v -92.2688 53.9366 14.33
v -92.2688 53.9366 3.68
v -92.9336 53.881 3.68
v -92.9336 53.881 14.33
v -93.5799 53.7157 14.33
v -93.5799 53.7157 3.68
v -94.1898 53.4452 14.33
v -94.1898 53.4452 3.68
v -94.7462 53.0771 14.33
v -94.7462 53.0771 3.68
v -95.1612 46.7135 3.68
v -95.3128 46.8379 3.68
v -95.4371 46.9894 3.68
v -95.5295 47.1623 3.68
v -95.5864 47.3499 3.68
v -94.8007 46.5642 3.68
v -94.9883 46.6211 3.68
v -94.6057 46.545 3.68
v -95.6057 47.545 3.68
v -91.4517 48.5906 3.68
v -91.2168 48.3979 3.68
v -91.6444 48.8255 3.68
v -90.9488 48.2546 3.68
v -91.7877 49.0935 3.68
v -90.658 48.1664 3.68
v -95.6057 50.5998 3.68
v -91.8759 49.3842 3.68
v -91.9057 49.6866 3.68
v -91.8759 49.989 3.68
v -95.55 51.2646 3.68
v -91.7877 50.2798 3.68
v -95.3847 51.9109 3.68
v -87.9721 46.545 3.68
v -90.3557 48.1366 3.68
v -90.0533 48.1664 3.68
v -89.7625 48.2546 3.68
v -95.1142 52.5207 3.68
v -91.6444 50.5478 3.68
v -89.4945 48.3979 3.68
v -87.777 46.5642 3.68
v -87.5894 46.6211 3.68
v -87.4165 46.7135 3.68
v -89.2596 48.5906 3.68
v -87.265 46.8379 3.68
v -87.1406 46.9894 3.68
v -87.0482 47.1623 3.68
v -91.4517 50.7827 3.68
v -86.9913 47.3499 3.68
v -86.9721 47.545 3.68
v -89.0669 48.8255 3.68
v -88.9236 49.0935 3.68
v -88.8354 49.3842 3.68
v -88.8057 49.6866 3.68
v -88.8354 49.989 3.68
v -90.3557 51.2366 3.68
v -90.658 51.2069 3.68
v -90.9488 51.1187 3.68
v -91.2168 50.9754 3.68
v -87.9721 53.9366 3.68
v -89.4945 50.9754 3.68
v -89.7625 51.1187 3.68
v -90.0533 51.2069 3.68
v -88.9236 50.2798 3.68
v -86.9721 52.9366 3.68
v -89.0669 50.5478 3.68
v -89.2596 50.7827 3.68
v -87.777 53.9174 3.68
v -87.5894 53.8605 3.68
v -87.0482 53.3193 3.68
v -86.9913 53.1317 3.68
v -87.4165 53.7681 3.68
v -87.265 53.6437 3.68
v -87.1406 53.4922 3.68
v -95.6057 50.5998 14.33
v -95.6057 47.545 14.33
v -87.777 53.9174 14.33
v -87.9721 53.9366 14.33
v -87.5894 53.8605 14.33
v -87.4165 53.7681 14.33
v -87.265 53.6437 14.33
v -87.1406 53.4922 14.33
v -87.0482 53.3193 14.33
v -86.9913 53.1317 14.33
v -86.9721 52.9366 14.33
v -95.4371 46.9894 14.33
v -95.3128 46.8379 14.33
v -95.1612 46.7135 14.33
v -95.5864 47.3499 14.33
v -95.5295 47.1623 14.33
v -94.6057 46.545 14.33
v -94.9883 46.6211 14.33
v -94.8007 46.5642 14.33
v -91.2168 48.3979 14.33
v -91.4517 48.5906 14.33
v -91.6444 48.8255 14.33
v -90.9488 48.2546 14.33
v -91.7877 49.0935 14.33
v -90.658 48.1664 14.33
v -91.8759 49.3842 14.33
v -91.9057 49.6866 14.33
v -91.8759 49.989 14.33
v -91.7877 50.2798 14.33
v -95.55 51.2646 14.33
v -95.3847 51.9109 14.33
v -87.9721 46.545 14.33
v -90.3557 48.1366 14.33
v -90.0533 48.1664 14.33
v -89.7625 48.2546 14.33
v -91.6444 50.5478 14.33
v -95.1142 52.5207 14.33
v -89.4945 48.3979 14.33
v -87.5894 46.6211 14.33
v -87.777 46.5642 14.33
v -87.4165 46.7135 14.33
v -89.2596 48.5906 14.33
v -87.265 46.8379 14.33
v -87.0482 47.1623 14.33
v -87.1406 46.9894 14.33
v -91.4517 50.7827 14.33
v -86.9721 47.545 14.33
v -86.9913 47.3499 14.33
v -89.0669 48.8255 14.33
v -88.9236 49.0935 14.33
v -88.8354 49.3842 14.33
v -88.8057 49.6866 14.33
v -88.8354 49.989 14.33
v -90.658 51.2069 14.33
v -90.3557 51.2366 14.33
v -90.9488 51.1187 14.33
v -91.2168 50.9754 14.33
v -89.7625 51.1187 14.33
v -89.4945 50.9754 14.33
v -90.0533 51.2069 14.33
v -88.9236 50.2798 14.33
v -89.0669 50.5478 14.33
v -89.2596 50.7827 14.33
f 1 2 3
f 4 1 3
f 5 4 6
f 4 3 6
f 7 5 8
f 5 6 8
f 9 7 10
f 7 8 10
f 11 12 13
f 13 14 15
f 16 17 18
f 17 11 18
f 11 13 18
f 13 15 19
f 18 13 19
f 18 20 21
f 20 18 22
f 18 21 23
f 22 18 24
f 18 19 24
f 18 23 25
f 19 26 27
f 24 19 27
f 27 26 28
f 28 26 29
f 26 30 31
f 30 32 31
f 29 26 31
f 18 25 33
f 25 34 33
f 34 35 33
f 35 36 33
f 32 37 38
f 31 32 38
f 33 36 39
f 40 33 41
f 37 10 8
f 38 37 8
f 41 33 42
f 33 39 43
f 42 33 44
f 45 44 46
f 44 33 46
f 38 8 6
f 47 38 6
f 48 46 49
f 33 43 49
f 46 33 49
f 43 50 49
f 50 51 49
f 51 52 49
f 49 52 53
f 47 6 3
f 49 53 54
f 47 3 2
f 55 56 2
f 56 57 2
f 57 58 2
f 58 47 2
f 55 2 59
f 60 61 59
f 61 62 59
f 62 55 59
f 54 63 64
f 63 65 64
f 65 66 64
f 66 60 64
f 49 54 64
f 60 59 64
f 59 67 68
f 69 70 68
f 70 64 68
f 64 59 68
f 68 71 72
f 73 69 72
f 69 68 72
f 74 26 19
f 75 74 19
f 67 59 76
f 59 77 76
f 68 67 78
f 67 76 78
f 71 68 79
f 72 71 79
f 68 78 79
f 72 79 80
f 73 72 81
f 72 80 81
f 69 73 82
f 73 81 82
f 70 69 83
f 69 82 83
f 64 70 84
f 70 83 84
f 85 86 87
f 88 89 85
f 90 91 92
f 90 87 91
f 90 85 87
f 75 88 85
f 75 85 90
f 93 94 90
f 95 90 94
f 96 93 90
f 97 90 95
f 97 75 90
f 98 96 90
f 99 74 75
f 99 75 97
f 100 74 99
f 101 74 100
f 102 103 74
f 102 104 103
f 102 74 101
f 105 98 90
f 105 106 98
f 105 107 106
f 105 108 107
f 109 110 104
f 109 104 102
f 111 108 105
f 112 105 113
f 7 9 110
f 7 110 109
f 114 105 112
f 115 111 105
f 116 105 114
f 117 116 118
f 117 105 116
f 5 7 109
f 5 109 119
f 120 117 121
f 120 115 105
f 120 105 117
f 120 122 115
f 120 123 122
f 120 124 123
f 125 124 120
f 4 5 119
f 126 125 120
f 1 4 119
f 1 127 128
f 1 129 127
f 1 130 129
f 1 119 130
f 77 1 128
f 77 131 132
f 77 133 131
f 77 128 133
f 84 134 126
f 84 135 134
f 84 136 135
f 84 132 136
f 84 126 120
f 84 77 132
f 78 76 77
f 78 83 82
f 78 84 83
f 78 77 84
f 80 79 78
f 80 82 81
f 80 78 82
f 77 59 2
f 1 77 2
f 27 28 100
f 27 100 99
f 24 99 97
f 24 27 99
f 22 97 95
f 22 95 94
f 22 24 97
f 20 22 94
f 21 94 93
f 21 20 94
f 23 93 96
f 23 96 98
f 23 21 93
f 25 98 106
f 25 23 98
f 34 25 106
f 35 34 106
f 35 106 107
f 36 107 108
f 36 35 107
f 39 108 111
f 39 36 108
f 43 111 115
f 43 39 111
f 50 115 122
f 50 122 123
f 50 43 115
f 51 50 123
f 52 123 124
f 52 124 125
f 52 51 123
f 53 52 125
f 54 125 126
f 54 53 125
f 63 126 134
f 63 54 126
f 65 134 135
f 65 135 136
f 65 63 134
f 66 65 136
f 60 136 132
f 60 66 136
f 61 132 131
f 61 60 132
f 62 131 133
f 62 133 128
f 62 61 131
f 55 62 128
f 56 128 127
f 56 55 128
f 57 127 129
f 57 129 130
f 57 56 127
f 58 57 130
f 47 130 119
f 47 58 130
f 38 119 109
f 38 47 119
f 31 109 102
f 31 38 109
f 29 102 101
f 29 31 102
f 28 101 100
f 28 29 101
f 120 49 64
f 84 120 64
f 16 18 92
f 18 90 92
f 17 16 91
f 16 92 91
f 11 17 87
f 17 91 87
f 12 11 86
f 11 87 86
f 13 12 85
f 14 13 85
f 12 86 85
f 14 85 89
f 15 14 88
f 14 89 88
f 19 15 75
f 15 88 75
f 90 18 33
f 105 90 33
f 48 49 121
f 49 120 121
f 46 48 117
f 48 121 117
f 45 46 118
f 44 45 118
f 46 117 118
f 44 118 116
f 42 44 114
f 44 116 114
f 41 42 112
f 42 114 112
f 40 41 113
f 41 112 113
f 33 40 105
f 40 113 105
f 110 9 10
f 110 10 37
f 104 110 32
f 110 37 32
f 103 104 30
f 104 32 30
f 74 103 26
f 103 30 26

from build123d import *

# Parameters (mm, degrees)
SKETCH_1_R          = 1.531489915
EXTRUDE_1_DEPTH     = 1.68
SKETCH_1_R_2        = 1.063949022
EXTRUDE_1_2_DEPTH   = 1.68
SKETCH_1_R_3        = 2.489250022
EXTRUDE_1_3_DEPTH   = 1.68
SKETCH_1_W          = 72.86
SKETCH_1_H          = 61.86
SKETCH_1_R_4        = 1.55
EXTRUDE_1_4_DEPTH   = 1.68
SKETCH_2_R          = 3
SKETCH_2_R_2        = 1.55
EXTRUDE_3_DEPTH     = 2
SKETCH_3_W          = 72.86
SKETCH_3_H          = 61.86
SKETCH_3_W_2        = 69.50125591
SKETCH_3_H_2        = 58.5
EXTRUDE_4_DEPTH     = 15.85
SKETCH_4_W          = 17
SKETCH_4_H          = 15
CUT_EXTRUDE_1_DEPTH = 3.68
SKETCH_6_W          = 7.25
SKETCH_6_H          = 16
SKETCH_6_W_2        = 2.5
SKETCH_6_H_2        = 18
CUT_EXTRUDE_3_DEPTH = 7.8
SKETCH_7_W          = 10
SKETCH_7_H          = 4
SKETCH_7_W_2        = 17
SKETCH_7_H_2        = 8
SKETCH_7_W_3        = 8
SKETCH_7_H_3        = 13.300256909
CUT_EXTRUDE_5_DEPTH = 2
SKETCH_8_R          = 1.556852558
SKETCH_8_W          = 2.041099746
SKETCH_8_H          = 24.945353107
CUT_EXTRUDE_6_DEPTH = 2
FILLET_1_R          = 1.68
FILLET_2_R          = 2
FILLET_3_R          = 1.68
FILLET_4_R          = 2
FILLET_5_R          = 3
FILLET_6_R          = 1
FILLET_7_R          = 1
SKETCH_9_R          = 4
CUT_EXTRUDE_7_DEPTH = 0.8
SKETCH_10_W         = 44.758598589
SKETCH_10_H         = 6.5
SKETCH_10_W_2       = 44.448850503
CUT_EXTRUDE_8_DEPTH = 0.8
SKETCH_11_R         = 1.55
EXTRUDE_6_DEPTH     = 10.65
CUT_EXTRUDE_9_DEPTH = 62.6
FILLET_8_R          = 4
FILLET_9_R          = 1


with BuildPart() as part:
    # 草图1 → 凸台-拉伸1 (new body)
    with BuildSketch(Plane.XY):
        with Locations((1.504266973, 51.672660554)):
            Circle(SKETCH_1_R)
    extrude(amount=EXTRUDE_1_DEPTH)


with BuildPart() as body_2:
    # 草图1 → Extrude 1 2 (new body)
    with BuildSketch(Plane.XY):
        with Locations((-18.258772408, 61.840992468)):
            Circle(SKETCH_1_R_2)
    extrude(amount=EXTRUDE_1_2_DEPTH)


with BuildPart() as body_3:
    # 草图1 → Extrude 1 3 (new body)
    with BuildSketch(Plane.XY):
        with Locations((-18.258772408, -10.975845657)):
            Circle(SKETCH_1_R_3)
    extrude(amount=EXTRUDE_1_3_DEPTH)


with BuildPart() as body_4:
    # 草图1 → Extrude 1 4 (new body)
    with BuildSketch(Plane.XY):
        with Locations((-46.758772408, 26.672660554)):
            Rectangle(SKETCH_1_W, SKETCH_1_H)
        with Locations((-76.258772408, 51.672660554)):
            Circle(SKETCH_1_R_4, mode=Mode.SUBTRACT)
        with Locations((-18.258772408, 51.672660554)):
            Circle(SKETCH_1_R_4, mode=Mode.SUBTRACT)
        with Locations((-76.258772408, 2.672660554)):
            Circle(SKETCH_1_R_4, mode=Mode.SUBTRACT)
        with Locations((-18.258772408, 2.672660554)):
            Circle(SKETCH_1_R_4, mode=Mode.SUBTRACT)
    extrude(amount=EXTRUDE_1_4_DEPTH)

    # 草图2 → 凸台-拉伸3 (add)
    # profile 1 of 4: a face of its own
    with BuildSketch(Plane.XY.offset(1.68)):
        with Locations((-76.258772408, 2.672660554)):
            Circle(SKETCH_2_R)
        with Locations((-76.258772408, 2.672660554)):
            Circle(SKETCH_2_R_2, mode=Mode.SUBTRACT)
    # profile 2 of 4: a face of its own
    with BuildSketch(Plane.XY.offset(1.68)):
        with Locations((-18.258772408, 2.672660554)):
            Circle(SKETCH_2_R)
        with Locations((-18.258772408, 2.672660554)):
            Circle(SKETCH_2_R_2, mode=Mode.SUBTRACT)
    # profile 3 of 4: a face of its own
    with BuildSketch(Plane.XY.offset(1.68)):
        with Locations((-76.258772408, 51.672660554)):
            Circle(SKETCH_2_R)
        with Locations((-76.258772408, 51.672660554)):
            Circle(SKETCH_2_R_2, mode=Mode.SUBTRACT)
    # profile 4 of 4: a face of its own
    with BuildSketch(Plane.XY.offset(1.68)):
        with Locations((-18.258772408, 51.672660554)):
            Circle(SKETCH_2_R)
        with Locations((-18.258772408, 51.672660554)):
            Circle(SKETCH_2_R_2, mode=Mode.SUBTRACT)
    extrude(amount=EXTRUDE_3_DEPTH)

    # 草图3 → 凸台-拉伸4 (add)
    with BuildSketch(Plane.XY.offset(1.68)):
        with Locations((-46.758772408, 26.672660554)):
            Rectangle(SKETCH_3_W, SKETCH_3_H)
        with Locations((-46.758144453, 26.672660554)):
            Rectangle(SKETCH_3_W_2, SKETCH_3_H_2, mode=Mode.SUBTRACT)
    extrude(amount=EXTRUDE_4_DEPTH)

    # 草图4 → 切除-拉伸1 (cut)
    with BuildSketch(Plane(origin=(0, 0, 0), x_dir=(-1, 0, 0), z_dir=(0, 0, -1))):
        with Locations((74.688772408, 28.322197805)):
            Rectangle(SKETCH_4_W, SKETCH_4_H)
    extrude(amount=-CUT_EXTRUDE_1_DEPTH, mode=Mode.SUBTRACT)

    # 草图6 → 切除-拉伸3 (cut)
    with BuildSketch(Plane(origin=(-10.328772408, 0, 0), x_dir=(0, 0, -1), z_dir=(1, 0, 0))):
        with Locations((-8.625, 30.672660554)):
            Rectangle(SKETCH_6_W, SKETCH_6_H)
        with Locations((-14.975303343, 19.628822862)):
            Rectangle(SKETCH_6_W_2, SKETCH_6_H_2)
    extrude(amount=-CUT_EXTRUDE_3_DEPTH, mode=Mode.SUBTRACT)

    # 草图7 → 切除-拉伸5 (cut)
    with BuildSketch(Plane.XZ.offset(4.257339446)):
        with Locations((-69.258772408, 6.68)):
            Rectangle(SKETCH_7_W, SKETCH_7_H)
        with Locations((-47.758772408, 8.68)):
            Rectangle(SKETCH_7_W_2, SKETCH_7_H_2)
        with Locations((-26.258772408, 11.330128455)):
            Rectangle(SKETCH_7_W_3, SKETCH_7_H_3)
    extrude(amount=-CUT_EXTRUDE_5_DEPTH, mode=Mode.SUBTRACT)

    # 草图8 → 切除-拉伸6 (cut)
    with BuildSketch(Plane.ZY.offset(83.188772408)):
        with Locations((7.843859074, 9.687980695)):
            Circle(SKETCH_8_R)
        with Locations((7.730007332, 28.982792683)):
            Rectangle(SKETCH_8_W, SKETCH_8_H)
    extrude(amount=-CUT_EXTRUDE_6_DEPTH, mode=Mode.SUBTRACT)

    # 圆角1
    fillet_1_edges = [body_4.edges().sort_by_distance(p)[0] for p in [
        (-12.007516498, 55.922660554, 9.605),
        (-81.508772408, 55.922660554, 9.605),
        (-81.508772408, -2.577339446, 9.605),
        (-12.007516498, -2.577339446, 9.605),
        (-10.328772408, -4.257339446, 8.765),
        (-83.188772408, -4.257339446, 8.765),
        (-83.188772408, 57.602660554, 8.765),
        (-10.328772408, 57.602660554, 8.765),
    ]]
    fillet(fillet_1_edges, radius=FILLET_1_R)

    # 圆角2
    fillet_2_edges = [body_4.edges().sort_by_distance(p)[0] for p in [
        (-66.188772408, 20.822197805, 0.84),
        (-66.188772408, 35.822197805, 0.84),
    ]]
    fillet(fillet_2_edges, radius=FILLET_2_R)

    # 圆角3
    fillet_3_edges = [body_4.edges().sort_by_distance(p)[0] for p in [
        (-74.258772408, -3.417339446, 4.68),
        (-64.258772408, -3.417339446, 4.68),
    ]]
    fillet(fillet_3_edges, radius=FILLET_3_R)

    # 圆角4
    fillet_4_edges = [body_4.edges().sort_by_distance(p)[0] for p in [
        (-56.258772408, -3.417339446, 4.68),
        (-39.258772408, -3.417339446, 4.68),
    ]]
    fillet(fillet_4_edges, radius=FILLET_4_R)

    # 圆角5
    fillet_5_edges = [body_4.edges().sort_by_distance(p)[0] for p in [
        (-30.258772408, -3.417339446, 4.68),
        (-22.258772408, -3.417339446, 4.68),
    ]]
    fillet(fillet_5_edges, radius=FILLET_5_R)

    # 圆角6
    fillet_6_edges = [body_4.edges().sort_by_distance(p)[0] for p in [
        (-11.168144453, 10.628822862, 16.225303343),
        (-11.168144453, 28.628822862, 16.225303343),
        (-11.168144453, 28.628822862, 13.725303343),
        (-11.168144453, 10.628822862, 13.725303343),
    ]]
    fillet(fillet_6_edges, radius=FILLET_6_R)

    # 圆角7
    fillet_7_edges = [body_4.edges().sort_by_distance(p)[0] for p in [
        (-11.168144453, 38.672660554, 5),
        (-11.168144453, 22.672660554, 5),
        (-11.168144453, 22.672660554, 12.25),
        (-11.168144453, 38.672660554, 12.25),
        (-82.348772408, 16.510116129, 6.709457459),
        (-82.348772408, 41.455469236, 6.709457459),
        (-82.348772408, 41.455469236, 8.750557205),
        (-82.348772408, 16.510116129, 8.750557205),
        (-82.348772408, 20.822197805, 3.68),
        (-82.348772408, 35.822197805, 3.68),
    ]]
    fillet(fillet_7_edges, radius=FILLET_7_R)

    # 草图9 → 切除-拉伸7 (cut)
    with BuildSketch(Plane(origin=(0, 0, 0), x_dir=(-1, 0, 0), z_dir=(0, 0, -1))):
        with Locations((18.258772408, 51.672660554)):
            Circle(SKETCH_9_R)
        with Locations((76.258772408, 51.672660554)):
            Circle(SKETCH_9_R)
        with Locations((18.258772408, 2.672660554)):
            Circle(SKETCH_9_R)
        with Locations((76.258772408, 2.672660554)):
            Circle(SKETCH_9_R)
    extrude(amount=-CUT_EXTRUDE_7_DEPTH, mode=Mode.SUBTRACT)

    # 草图10 → 切除-拉伸8 (cut)
    with BuildSketch(Plane(origin=(0, 0, 0), x_dir=(-1, 0, 0), z_dir=(0, 0, -1))):
        with Locations((41.37196271, 38.672660554)):
            Rectangle(SKETCH_10_W, SKETCH_10_H)
        with Locations((41.37196271, 14.672660554)):
            Rectangle(SKETCH_10_W_2, SKETCH_10_H)
    extrude(amount=-CUT_EXTRUDE_8_DEPTH, mode=Mode.SUBTRACT)

    # 草图11 → 凸台-拉伸6 (add)
    # profile 1 of 2: a face of its own
    with BuildSketch(Plane.XY.offset(3.68)):
        Polygon((-79.828772408, 55.922660554), (-81.508772408, 54.242660554), (-81.508772408, 48.531036753), (-72.875228226, 48.531036753), (-72.875228226, 55.922660554), align=None)
        with Locations(Location((-76.258772408, 51.672660554, 0), (0, 0, 180))):
            Circle(SKETCH_11_R, mode=Mode.SUBTRACT)
    # profile 2 of 2: a face of its own
    with BuildSketch(Plane.XY.offset(3.68)):
        Polygon((-93.925658587, 53.936639744), (-95.605658587, 52.256639744), (-95.605658587, 46.545015943), (-86.972114405, 46.545015943), (-86.972114405, 53.936639744), align=None)
        with Locations(Location((-90.355658587, 49.686639744, 0), (0, 0, 180))):
            Circle(SKETCH_11_R, mode=Mode.SUBTRACT)
    extrude(amount=EXTRUDE_6_DEPTH)


with BuildPart() as extrude_6_piece_1:
    # of the separate pieces the step leaves, piece 1, a body of its own (extrude_6_pieces)
    add(body_4.part.solids().sort_by_distance((-10.328772408, 38.672660554, 6))[0])


with BuildPart() as extrude_6_piece_2:
    # of the separate pieces the step leaves, piece 2, a body of its own (extrude_6_pieces)
    add(body_4.part.solids().sort_by_distance((-93.925658587, 53.936639744, 3.68))[0])

    # 圆角8
    # the kernel refuses this fillet: 4 mm, written as the material it takes off along each edge
    with BuildSketch(Plane(origin=(-93.925658587, 53.936639744, -0.462135624), x_dir=(-0.7071067811865455, -0.7071067811865497, 0), z_dir=(0, 0, 1))) as fillet_8_piece_1:
        with BuildLine():
            CenterArc((FILLET_8_R * 0.414213562373, FILLET_8_R), FILLET_8_R, 225, 45)
            Line((-FILLET_8_R * 0.292893218813, FILLET_8_R * 0.292893218813), (0, 0))
            Line((0, 0), (FILLET_8_R * 0.414213562373, 0))
        make_face()
    extrude(amount=18.934271247, mode=Mode.SUBTRACT)
    with BuildSketch(Plane(origin=(-95.605658587, 52.256639744, -0.462135624), x_dir=(0.7071067811865411, 0.707106781186554, 0), z_dir=(0, 0, 1))) as fillet_8_piece_2:
        with BuildLine():
            CenterArc((FILLET_8_R * 0.414213562373, -FILLET_8_R), FILLET_8_R, 90, 45)
            Line((-FILLET_8_R * 0.292893218813, -FILLET_8_R * 0.292893218813), (0, 0))
            Line((0, 0), (FILLET_8_R * 0.414213562373, 0))
        make_face()
    extrude(amount=18.934271247, mode=Mode.SUBTRACT)

    # 圆角9
    fillet_9_edges = [extrude_6_piece_2.edges().sort_by_distance(p)[0] for p in [
        (-86.972114405, 53.936639744, 9.005),
        (-86.972114405, 46.545015943, 9.005),
        (-95.605658587, 46.545015943, 9.005),
    ]]
    fillet(fillet_9_edges, radius=FILLET_9_R)


with BuildPart() as cut_extrude_9_tool:
    # 草图13 → 切除-拉伸9 (new body)
    with BuildSketch(Plane.XY.offset(17.53)):
        Polygon((-85.534397359, 61.466506159), (-87.240895033, -11.116528255), (-1.802244806, -17.146153371), (14.580132867, 61.466506159), (-40.278079036, 71.546219088), align=None)
    extrude(amount=-CUT_EXTRUDE_9_DEPTH)


with BuildPart() as part_1:
    add(part.part)

    # 切除-拉伸9: cut by cut_extrude_9_tool
    add(cut_extrude_9_tool.part, mode=Mode.SUBTRACT)


with BuildPart() as body_2_1:
    add(body_2.part)

    # 切除-拉伸9: cut by cut_extrude_9_tool
    add(cut_extrude_9_tool.part, mode=Mode.SUBTRACT)


with BuildPart() as body_3_1:
    add(body_3.part)

    # 切除-拉伸9: cut by cut_extrude_9_tool
    add(cut_extrude_9_tool.part, mode=Mode.SUBTRACT)


with BuildPart() as extrude_6_piece_1_1:
    add(extrude_6_piece_1.part)

    # 切除-拉伸9: cut by cut_extrude_9_tool
    add(cut_extrude_9_tool.part, mode=Mode.SUBTRACT)


solid = extrude_6_piece_2.part
